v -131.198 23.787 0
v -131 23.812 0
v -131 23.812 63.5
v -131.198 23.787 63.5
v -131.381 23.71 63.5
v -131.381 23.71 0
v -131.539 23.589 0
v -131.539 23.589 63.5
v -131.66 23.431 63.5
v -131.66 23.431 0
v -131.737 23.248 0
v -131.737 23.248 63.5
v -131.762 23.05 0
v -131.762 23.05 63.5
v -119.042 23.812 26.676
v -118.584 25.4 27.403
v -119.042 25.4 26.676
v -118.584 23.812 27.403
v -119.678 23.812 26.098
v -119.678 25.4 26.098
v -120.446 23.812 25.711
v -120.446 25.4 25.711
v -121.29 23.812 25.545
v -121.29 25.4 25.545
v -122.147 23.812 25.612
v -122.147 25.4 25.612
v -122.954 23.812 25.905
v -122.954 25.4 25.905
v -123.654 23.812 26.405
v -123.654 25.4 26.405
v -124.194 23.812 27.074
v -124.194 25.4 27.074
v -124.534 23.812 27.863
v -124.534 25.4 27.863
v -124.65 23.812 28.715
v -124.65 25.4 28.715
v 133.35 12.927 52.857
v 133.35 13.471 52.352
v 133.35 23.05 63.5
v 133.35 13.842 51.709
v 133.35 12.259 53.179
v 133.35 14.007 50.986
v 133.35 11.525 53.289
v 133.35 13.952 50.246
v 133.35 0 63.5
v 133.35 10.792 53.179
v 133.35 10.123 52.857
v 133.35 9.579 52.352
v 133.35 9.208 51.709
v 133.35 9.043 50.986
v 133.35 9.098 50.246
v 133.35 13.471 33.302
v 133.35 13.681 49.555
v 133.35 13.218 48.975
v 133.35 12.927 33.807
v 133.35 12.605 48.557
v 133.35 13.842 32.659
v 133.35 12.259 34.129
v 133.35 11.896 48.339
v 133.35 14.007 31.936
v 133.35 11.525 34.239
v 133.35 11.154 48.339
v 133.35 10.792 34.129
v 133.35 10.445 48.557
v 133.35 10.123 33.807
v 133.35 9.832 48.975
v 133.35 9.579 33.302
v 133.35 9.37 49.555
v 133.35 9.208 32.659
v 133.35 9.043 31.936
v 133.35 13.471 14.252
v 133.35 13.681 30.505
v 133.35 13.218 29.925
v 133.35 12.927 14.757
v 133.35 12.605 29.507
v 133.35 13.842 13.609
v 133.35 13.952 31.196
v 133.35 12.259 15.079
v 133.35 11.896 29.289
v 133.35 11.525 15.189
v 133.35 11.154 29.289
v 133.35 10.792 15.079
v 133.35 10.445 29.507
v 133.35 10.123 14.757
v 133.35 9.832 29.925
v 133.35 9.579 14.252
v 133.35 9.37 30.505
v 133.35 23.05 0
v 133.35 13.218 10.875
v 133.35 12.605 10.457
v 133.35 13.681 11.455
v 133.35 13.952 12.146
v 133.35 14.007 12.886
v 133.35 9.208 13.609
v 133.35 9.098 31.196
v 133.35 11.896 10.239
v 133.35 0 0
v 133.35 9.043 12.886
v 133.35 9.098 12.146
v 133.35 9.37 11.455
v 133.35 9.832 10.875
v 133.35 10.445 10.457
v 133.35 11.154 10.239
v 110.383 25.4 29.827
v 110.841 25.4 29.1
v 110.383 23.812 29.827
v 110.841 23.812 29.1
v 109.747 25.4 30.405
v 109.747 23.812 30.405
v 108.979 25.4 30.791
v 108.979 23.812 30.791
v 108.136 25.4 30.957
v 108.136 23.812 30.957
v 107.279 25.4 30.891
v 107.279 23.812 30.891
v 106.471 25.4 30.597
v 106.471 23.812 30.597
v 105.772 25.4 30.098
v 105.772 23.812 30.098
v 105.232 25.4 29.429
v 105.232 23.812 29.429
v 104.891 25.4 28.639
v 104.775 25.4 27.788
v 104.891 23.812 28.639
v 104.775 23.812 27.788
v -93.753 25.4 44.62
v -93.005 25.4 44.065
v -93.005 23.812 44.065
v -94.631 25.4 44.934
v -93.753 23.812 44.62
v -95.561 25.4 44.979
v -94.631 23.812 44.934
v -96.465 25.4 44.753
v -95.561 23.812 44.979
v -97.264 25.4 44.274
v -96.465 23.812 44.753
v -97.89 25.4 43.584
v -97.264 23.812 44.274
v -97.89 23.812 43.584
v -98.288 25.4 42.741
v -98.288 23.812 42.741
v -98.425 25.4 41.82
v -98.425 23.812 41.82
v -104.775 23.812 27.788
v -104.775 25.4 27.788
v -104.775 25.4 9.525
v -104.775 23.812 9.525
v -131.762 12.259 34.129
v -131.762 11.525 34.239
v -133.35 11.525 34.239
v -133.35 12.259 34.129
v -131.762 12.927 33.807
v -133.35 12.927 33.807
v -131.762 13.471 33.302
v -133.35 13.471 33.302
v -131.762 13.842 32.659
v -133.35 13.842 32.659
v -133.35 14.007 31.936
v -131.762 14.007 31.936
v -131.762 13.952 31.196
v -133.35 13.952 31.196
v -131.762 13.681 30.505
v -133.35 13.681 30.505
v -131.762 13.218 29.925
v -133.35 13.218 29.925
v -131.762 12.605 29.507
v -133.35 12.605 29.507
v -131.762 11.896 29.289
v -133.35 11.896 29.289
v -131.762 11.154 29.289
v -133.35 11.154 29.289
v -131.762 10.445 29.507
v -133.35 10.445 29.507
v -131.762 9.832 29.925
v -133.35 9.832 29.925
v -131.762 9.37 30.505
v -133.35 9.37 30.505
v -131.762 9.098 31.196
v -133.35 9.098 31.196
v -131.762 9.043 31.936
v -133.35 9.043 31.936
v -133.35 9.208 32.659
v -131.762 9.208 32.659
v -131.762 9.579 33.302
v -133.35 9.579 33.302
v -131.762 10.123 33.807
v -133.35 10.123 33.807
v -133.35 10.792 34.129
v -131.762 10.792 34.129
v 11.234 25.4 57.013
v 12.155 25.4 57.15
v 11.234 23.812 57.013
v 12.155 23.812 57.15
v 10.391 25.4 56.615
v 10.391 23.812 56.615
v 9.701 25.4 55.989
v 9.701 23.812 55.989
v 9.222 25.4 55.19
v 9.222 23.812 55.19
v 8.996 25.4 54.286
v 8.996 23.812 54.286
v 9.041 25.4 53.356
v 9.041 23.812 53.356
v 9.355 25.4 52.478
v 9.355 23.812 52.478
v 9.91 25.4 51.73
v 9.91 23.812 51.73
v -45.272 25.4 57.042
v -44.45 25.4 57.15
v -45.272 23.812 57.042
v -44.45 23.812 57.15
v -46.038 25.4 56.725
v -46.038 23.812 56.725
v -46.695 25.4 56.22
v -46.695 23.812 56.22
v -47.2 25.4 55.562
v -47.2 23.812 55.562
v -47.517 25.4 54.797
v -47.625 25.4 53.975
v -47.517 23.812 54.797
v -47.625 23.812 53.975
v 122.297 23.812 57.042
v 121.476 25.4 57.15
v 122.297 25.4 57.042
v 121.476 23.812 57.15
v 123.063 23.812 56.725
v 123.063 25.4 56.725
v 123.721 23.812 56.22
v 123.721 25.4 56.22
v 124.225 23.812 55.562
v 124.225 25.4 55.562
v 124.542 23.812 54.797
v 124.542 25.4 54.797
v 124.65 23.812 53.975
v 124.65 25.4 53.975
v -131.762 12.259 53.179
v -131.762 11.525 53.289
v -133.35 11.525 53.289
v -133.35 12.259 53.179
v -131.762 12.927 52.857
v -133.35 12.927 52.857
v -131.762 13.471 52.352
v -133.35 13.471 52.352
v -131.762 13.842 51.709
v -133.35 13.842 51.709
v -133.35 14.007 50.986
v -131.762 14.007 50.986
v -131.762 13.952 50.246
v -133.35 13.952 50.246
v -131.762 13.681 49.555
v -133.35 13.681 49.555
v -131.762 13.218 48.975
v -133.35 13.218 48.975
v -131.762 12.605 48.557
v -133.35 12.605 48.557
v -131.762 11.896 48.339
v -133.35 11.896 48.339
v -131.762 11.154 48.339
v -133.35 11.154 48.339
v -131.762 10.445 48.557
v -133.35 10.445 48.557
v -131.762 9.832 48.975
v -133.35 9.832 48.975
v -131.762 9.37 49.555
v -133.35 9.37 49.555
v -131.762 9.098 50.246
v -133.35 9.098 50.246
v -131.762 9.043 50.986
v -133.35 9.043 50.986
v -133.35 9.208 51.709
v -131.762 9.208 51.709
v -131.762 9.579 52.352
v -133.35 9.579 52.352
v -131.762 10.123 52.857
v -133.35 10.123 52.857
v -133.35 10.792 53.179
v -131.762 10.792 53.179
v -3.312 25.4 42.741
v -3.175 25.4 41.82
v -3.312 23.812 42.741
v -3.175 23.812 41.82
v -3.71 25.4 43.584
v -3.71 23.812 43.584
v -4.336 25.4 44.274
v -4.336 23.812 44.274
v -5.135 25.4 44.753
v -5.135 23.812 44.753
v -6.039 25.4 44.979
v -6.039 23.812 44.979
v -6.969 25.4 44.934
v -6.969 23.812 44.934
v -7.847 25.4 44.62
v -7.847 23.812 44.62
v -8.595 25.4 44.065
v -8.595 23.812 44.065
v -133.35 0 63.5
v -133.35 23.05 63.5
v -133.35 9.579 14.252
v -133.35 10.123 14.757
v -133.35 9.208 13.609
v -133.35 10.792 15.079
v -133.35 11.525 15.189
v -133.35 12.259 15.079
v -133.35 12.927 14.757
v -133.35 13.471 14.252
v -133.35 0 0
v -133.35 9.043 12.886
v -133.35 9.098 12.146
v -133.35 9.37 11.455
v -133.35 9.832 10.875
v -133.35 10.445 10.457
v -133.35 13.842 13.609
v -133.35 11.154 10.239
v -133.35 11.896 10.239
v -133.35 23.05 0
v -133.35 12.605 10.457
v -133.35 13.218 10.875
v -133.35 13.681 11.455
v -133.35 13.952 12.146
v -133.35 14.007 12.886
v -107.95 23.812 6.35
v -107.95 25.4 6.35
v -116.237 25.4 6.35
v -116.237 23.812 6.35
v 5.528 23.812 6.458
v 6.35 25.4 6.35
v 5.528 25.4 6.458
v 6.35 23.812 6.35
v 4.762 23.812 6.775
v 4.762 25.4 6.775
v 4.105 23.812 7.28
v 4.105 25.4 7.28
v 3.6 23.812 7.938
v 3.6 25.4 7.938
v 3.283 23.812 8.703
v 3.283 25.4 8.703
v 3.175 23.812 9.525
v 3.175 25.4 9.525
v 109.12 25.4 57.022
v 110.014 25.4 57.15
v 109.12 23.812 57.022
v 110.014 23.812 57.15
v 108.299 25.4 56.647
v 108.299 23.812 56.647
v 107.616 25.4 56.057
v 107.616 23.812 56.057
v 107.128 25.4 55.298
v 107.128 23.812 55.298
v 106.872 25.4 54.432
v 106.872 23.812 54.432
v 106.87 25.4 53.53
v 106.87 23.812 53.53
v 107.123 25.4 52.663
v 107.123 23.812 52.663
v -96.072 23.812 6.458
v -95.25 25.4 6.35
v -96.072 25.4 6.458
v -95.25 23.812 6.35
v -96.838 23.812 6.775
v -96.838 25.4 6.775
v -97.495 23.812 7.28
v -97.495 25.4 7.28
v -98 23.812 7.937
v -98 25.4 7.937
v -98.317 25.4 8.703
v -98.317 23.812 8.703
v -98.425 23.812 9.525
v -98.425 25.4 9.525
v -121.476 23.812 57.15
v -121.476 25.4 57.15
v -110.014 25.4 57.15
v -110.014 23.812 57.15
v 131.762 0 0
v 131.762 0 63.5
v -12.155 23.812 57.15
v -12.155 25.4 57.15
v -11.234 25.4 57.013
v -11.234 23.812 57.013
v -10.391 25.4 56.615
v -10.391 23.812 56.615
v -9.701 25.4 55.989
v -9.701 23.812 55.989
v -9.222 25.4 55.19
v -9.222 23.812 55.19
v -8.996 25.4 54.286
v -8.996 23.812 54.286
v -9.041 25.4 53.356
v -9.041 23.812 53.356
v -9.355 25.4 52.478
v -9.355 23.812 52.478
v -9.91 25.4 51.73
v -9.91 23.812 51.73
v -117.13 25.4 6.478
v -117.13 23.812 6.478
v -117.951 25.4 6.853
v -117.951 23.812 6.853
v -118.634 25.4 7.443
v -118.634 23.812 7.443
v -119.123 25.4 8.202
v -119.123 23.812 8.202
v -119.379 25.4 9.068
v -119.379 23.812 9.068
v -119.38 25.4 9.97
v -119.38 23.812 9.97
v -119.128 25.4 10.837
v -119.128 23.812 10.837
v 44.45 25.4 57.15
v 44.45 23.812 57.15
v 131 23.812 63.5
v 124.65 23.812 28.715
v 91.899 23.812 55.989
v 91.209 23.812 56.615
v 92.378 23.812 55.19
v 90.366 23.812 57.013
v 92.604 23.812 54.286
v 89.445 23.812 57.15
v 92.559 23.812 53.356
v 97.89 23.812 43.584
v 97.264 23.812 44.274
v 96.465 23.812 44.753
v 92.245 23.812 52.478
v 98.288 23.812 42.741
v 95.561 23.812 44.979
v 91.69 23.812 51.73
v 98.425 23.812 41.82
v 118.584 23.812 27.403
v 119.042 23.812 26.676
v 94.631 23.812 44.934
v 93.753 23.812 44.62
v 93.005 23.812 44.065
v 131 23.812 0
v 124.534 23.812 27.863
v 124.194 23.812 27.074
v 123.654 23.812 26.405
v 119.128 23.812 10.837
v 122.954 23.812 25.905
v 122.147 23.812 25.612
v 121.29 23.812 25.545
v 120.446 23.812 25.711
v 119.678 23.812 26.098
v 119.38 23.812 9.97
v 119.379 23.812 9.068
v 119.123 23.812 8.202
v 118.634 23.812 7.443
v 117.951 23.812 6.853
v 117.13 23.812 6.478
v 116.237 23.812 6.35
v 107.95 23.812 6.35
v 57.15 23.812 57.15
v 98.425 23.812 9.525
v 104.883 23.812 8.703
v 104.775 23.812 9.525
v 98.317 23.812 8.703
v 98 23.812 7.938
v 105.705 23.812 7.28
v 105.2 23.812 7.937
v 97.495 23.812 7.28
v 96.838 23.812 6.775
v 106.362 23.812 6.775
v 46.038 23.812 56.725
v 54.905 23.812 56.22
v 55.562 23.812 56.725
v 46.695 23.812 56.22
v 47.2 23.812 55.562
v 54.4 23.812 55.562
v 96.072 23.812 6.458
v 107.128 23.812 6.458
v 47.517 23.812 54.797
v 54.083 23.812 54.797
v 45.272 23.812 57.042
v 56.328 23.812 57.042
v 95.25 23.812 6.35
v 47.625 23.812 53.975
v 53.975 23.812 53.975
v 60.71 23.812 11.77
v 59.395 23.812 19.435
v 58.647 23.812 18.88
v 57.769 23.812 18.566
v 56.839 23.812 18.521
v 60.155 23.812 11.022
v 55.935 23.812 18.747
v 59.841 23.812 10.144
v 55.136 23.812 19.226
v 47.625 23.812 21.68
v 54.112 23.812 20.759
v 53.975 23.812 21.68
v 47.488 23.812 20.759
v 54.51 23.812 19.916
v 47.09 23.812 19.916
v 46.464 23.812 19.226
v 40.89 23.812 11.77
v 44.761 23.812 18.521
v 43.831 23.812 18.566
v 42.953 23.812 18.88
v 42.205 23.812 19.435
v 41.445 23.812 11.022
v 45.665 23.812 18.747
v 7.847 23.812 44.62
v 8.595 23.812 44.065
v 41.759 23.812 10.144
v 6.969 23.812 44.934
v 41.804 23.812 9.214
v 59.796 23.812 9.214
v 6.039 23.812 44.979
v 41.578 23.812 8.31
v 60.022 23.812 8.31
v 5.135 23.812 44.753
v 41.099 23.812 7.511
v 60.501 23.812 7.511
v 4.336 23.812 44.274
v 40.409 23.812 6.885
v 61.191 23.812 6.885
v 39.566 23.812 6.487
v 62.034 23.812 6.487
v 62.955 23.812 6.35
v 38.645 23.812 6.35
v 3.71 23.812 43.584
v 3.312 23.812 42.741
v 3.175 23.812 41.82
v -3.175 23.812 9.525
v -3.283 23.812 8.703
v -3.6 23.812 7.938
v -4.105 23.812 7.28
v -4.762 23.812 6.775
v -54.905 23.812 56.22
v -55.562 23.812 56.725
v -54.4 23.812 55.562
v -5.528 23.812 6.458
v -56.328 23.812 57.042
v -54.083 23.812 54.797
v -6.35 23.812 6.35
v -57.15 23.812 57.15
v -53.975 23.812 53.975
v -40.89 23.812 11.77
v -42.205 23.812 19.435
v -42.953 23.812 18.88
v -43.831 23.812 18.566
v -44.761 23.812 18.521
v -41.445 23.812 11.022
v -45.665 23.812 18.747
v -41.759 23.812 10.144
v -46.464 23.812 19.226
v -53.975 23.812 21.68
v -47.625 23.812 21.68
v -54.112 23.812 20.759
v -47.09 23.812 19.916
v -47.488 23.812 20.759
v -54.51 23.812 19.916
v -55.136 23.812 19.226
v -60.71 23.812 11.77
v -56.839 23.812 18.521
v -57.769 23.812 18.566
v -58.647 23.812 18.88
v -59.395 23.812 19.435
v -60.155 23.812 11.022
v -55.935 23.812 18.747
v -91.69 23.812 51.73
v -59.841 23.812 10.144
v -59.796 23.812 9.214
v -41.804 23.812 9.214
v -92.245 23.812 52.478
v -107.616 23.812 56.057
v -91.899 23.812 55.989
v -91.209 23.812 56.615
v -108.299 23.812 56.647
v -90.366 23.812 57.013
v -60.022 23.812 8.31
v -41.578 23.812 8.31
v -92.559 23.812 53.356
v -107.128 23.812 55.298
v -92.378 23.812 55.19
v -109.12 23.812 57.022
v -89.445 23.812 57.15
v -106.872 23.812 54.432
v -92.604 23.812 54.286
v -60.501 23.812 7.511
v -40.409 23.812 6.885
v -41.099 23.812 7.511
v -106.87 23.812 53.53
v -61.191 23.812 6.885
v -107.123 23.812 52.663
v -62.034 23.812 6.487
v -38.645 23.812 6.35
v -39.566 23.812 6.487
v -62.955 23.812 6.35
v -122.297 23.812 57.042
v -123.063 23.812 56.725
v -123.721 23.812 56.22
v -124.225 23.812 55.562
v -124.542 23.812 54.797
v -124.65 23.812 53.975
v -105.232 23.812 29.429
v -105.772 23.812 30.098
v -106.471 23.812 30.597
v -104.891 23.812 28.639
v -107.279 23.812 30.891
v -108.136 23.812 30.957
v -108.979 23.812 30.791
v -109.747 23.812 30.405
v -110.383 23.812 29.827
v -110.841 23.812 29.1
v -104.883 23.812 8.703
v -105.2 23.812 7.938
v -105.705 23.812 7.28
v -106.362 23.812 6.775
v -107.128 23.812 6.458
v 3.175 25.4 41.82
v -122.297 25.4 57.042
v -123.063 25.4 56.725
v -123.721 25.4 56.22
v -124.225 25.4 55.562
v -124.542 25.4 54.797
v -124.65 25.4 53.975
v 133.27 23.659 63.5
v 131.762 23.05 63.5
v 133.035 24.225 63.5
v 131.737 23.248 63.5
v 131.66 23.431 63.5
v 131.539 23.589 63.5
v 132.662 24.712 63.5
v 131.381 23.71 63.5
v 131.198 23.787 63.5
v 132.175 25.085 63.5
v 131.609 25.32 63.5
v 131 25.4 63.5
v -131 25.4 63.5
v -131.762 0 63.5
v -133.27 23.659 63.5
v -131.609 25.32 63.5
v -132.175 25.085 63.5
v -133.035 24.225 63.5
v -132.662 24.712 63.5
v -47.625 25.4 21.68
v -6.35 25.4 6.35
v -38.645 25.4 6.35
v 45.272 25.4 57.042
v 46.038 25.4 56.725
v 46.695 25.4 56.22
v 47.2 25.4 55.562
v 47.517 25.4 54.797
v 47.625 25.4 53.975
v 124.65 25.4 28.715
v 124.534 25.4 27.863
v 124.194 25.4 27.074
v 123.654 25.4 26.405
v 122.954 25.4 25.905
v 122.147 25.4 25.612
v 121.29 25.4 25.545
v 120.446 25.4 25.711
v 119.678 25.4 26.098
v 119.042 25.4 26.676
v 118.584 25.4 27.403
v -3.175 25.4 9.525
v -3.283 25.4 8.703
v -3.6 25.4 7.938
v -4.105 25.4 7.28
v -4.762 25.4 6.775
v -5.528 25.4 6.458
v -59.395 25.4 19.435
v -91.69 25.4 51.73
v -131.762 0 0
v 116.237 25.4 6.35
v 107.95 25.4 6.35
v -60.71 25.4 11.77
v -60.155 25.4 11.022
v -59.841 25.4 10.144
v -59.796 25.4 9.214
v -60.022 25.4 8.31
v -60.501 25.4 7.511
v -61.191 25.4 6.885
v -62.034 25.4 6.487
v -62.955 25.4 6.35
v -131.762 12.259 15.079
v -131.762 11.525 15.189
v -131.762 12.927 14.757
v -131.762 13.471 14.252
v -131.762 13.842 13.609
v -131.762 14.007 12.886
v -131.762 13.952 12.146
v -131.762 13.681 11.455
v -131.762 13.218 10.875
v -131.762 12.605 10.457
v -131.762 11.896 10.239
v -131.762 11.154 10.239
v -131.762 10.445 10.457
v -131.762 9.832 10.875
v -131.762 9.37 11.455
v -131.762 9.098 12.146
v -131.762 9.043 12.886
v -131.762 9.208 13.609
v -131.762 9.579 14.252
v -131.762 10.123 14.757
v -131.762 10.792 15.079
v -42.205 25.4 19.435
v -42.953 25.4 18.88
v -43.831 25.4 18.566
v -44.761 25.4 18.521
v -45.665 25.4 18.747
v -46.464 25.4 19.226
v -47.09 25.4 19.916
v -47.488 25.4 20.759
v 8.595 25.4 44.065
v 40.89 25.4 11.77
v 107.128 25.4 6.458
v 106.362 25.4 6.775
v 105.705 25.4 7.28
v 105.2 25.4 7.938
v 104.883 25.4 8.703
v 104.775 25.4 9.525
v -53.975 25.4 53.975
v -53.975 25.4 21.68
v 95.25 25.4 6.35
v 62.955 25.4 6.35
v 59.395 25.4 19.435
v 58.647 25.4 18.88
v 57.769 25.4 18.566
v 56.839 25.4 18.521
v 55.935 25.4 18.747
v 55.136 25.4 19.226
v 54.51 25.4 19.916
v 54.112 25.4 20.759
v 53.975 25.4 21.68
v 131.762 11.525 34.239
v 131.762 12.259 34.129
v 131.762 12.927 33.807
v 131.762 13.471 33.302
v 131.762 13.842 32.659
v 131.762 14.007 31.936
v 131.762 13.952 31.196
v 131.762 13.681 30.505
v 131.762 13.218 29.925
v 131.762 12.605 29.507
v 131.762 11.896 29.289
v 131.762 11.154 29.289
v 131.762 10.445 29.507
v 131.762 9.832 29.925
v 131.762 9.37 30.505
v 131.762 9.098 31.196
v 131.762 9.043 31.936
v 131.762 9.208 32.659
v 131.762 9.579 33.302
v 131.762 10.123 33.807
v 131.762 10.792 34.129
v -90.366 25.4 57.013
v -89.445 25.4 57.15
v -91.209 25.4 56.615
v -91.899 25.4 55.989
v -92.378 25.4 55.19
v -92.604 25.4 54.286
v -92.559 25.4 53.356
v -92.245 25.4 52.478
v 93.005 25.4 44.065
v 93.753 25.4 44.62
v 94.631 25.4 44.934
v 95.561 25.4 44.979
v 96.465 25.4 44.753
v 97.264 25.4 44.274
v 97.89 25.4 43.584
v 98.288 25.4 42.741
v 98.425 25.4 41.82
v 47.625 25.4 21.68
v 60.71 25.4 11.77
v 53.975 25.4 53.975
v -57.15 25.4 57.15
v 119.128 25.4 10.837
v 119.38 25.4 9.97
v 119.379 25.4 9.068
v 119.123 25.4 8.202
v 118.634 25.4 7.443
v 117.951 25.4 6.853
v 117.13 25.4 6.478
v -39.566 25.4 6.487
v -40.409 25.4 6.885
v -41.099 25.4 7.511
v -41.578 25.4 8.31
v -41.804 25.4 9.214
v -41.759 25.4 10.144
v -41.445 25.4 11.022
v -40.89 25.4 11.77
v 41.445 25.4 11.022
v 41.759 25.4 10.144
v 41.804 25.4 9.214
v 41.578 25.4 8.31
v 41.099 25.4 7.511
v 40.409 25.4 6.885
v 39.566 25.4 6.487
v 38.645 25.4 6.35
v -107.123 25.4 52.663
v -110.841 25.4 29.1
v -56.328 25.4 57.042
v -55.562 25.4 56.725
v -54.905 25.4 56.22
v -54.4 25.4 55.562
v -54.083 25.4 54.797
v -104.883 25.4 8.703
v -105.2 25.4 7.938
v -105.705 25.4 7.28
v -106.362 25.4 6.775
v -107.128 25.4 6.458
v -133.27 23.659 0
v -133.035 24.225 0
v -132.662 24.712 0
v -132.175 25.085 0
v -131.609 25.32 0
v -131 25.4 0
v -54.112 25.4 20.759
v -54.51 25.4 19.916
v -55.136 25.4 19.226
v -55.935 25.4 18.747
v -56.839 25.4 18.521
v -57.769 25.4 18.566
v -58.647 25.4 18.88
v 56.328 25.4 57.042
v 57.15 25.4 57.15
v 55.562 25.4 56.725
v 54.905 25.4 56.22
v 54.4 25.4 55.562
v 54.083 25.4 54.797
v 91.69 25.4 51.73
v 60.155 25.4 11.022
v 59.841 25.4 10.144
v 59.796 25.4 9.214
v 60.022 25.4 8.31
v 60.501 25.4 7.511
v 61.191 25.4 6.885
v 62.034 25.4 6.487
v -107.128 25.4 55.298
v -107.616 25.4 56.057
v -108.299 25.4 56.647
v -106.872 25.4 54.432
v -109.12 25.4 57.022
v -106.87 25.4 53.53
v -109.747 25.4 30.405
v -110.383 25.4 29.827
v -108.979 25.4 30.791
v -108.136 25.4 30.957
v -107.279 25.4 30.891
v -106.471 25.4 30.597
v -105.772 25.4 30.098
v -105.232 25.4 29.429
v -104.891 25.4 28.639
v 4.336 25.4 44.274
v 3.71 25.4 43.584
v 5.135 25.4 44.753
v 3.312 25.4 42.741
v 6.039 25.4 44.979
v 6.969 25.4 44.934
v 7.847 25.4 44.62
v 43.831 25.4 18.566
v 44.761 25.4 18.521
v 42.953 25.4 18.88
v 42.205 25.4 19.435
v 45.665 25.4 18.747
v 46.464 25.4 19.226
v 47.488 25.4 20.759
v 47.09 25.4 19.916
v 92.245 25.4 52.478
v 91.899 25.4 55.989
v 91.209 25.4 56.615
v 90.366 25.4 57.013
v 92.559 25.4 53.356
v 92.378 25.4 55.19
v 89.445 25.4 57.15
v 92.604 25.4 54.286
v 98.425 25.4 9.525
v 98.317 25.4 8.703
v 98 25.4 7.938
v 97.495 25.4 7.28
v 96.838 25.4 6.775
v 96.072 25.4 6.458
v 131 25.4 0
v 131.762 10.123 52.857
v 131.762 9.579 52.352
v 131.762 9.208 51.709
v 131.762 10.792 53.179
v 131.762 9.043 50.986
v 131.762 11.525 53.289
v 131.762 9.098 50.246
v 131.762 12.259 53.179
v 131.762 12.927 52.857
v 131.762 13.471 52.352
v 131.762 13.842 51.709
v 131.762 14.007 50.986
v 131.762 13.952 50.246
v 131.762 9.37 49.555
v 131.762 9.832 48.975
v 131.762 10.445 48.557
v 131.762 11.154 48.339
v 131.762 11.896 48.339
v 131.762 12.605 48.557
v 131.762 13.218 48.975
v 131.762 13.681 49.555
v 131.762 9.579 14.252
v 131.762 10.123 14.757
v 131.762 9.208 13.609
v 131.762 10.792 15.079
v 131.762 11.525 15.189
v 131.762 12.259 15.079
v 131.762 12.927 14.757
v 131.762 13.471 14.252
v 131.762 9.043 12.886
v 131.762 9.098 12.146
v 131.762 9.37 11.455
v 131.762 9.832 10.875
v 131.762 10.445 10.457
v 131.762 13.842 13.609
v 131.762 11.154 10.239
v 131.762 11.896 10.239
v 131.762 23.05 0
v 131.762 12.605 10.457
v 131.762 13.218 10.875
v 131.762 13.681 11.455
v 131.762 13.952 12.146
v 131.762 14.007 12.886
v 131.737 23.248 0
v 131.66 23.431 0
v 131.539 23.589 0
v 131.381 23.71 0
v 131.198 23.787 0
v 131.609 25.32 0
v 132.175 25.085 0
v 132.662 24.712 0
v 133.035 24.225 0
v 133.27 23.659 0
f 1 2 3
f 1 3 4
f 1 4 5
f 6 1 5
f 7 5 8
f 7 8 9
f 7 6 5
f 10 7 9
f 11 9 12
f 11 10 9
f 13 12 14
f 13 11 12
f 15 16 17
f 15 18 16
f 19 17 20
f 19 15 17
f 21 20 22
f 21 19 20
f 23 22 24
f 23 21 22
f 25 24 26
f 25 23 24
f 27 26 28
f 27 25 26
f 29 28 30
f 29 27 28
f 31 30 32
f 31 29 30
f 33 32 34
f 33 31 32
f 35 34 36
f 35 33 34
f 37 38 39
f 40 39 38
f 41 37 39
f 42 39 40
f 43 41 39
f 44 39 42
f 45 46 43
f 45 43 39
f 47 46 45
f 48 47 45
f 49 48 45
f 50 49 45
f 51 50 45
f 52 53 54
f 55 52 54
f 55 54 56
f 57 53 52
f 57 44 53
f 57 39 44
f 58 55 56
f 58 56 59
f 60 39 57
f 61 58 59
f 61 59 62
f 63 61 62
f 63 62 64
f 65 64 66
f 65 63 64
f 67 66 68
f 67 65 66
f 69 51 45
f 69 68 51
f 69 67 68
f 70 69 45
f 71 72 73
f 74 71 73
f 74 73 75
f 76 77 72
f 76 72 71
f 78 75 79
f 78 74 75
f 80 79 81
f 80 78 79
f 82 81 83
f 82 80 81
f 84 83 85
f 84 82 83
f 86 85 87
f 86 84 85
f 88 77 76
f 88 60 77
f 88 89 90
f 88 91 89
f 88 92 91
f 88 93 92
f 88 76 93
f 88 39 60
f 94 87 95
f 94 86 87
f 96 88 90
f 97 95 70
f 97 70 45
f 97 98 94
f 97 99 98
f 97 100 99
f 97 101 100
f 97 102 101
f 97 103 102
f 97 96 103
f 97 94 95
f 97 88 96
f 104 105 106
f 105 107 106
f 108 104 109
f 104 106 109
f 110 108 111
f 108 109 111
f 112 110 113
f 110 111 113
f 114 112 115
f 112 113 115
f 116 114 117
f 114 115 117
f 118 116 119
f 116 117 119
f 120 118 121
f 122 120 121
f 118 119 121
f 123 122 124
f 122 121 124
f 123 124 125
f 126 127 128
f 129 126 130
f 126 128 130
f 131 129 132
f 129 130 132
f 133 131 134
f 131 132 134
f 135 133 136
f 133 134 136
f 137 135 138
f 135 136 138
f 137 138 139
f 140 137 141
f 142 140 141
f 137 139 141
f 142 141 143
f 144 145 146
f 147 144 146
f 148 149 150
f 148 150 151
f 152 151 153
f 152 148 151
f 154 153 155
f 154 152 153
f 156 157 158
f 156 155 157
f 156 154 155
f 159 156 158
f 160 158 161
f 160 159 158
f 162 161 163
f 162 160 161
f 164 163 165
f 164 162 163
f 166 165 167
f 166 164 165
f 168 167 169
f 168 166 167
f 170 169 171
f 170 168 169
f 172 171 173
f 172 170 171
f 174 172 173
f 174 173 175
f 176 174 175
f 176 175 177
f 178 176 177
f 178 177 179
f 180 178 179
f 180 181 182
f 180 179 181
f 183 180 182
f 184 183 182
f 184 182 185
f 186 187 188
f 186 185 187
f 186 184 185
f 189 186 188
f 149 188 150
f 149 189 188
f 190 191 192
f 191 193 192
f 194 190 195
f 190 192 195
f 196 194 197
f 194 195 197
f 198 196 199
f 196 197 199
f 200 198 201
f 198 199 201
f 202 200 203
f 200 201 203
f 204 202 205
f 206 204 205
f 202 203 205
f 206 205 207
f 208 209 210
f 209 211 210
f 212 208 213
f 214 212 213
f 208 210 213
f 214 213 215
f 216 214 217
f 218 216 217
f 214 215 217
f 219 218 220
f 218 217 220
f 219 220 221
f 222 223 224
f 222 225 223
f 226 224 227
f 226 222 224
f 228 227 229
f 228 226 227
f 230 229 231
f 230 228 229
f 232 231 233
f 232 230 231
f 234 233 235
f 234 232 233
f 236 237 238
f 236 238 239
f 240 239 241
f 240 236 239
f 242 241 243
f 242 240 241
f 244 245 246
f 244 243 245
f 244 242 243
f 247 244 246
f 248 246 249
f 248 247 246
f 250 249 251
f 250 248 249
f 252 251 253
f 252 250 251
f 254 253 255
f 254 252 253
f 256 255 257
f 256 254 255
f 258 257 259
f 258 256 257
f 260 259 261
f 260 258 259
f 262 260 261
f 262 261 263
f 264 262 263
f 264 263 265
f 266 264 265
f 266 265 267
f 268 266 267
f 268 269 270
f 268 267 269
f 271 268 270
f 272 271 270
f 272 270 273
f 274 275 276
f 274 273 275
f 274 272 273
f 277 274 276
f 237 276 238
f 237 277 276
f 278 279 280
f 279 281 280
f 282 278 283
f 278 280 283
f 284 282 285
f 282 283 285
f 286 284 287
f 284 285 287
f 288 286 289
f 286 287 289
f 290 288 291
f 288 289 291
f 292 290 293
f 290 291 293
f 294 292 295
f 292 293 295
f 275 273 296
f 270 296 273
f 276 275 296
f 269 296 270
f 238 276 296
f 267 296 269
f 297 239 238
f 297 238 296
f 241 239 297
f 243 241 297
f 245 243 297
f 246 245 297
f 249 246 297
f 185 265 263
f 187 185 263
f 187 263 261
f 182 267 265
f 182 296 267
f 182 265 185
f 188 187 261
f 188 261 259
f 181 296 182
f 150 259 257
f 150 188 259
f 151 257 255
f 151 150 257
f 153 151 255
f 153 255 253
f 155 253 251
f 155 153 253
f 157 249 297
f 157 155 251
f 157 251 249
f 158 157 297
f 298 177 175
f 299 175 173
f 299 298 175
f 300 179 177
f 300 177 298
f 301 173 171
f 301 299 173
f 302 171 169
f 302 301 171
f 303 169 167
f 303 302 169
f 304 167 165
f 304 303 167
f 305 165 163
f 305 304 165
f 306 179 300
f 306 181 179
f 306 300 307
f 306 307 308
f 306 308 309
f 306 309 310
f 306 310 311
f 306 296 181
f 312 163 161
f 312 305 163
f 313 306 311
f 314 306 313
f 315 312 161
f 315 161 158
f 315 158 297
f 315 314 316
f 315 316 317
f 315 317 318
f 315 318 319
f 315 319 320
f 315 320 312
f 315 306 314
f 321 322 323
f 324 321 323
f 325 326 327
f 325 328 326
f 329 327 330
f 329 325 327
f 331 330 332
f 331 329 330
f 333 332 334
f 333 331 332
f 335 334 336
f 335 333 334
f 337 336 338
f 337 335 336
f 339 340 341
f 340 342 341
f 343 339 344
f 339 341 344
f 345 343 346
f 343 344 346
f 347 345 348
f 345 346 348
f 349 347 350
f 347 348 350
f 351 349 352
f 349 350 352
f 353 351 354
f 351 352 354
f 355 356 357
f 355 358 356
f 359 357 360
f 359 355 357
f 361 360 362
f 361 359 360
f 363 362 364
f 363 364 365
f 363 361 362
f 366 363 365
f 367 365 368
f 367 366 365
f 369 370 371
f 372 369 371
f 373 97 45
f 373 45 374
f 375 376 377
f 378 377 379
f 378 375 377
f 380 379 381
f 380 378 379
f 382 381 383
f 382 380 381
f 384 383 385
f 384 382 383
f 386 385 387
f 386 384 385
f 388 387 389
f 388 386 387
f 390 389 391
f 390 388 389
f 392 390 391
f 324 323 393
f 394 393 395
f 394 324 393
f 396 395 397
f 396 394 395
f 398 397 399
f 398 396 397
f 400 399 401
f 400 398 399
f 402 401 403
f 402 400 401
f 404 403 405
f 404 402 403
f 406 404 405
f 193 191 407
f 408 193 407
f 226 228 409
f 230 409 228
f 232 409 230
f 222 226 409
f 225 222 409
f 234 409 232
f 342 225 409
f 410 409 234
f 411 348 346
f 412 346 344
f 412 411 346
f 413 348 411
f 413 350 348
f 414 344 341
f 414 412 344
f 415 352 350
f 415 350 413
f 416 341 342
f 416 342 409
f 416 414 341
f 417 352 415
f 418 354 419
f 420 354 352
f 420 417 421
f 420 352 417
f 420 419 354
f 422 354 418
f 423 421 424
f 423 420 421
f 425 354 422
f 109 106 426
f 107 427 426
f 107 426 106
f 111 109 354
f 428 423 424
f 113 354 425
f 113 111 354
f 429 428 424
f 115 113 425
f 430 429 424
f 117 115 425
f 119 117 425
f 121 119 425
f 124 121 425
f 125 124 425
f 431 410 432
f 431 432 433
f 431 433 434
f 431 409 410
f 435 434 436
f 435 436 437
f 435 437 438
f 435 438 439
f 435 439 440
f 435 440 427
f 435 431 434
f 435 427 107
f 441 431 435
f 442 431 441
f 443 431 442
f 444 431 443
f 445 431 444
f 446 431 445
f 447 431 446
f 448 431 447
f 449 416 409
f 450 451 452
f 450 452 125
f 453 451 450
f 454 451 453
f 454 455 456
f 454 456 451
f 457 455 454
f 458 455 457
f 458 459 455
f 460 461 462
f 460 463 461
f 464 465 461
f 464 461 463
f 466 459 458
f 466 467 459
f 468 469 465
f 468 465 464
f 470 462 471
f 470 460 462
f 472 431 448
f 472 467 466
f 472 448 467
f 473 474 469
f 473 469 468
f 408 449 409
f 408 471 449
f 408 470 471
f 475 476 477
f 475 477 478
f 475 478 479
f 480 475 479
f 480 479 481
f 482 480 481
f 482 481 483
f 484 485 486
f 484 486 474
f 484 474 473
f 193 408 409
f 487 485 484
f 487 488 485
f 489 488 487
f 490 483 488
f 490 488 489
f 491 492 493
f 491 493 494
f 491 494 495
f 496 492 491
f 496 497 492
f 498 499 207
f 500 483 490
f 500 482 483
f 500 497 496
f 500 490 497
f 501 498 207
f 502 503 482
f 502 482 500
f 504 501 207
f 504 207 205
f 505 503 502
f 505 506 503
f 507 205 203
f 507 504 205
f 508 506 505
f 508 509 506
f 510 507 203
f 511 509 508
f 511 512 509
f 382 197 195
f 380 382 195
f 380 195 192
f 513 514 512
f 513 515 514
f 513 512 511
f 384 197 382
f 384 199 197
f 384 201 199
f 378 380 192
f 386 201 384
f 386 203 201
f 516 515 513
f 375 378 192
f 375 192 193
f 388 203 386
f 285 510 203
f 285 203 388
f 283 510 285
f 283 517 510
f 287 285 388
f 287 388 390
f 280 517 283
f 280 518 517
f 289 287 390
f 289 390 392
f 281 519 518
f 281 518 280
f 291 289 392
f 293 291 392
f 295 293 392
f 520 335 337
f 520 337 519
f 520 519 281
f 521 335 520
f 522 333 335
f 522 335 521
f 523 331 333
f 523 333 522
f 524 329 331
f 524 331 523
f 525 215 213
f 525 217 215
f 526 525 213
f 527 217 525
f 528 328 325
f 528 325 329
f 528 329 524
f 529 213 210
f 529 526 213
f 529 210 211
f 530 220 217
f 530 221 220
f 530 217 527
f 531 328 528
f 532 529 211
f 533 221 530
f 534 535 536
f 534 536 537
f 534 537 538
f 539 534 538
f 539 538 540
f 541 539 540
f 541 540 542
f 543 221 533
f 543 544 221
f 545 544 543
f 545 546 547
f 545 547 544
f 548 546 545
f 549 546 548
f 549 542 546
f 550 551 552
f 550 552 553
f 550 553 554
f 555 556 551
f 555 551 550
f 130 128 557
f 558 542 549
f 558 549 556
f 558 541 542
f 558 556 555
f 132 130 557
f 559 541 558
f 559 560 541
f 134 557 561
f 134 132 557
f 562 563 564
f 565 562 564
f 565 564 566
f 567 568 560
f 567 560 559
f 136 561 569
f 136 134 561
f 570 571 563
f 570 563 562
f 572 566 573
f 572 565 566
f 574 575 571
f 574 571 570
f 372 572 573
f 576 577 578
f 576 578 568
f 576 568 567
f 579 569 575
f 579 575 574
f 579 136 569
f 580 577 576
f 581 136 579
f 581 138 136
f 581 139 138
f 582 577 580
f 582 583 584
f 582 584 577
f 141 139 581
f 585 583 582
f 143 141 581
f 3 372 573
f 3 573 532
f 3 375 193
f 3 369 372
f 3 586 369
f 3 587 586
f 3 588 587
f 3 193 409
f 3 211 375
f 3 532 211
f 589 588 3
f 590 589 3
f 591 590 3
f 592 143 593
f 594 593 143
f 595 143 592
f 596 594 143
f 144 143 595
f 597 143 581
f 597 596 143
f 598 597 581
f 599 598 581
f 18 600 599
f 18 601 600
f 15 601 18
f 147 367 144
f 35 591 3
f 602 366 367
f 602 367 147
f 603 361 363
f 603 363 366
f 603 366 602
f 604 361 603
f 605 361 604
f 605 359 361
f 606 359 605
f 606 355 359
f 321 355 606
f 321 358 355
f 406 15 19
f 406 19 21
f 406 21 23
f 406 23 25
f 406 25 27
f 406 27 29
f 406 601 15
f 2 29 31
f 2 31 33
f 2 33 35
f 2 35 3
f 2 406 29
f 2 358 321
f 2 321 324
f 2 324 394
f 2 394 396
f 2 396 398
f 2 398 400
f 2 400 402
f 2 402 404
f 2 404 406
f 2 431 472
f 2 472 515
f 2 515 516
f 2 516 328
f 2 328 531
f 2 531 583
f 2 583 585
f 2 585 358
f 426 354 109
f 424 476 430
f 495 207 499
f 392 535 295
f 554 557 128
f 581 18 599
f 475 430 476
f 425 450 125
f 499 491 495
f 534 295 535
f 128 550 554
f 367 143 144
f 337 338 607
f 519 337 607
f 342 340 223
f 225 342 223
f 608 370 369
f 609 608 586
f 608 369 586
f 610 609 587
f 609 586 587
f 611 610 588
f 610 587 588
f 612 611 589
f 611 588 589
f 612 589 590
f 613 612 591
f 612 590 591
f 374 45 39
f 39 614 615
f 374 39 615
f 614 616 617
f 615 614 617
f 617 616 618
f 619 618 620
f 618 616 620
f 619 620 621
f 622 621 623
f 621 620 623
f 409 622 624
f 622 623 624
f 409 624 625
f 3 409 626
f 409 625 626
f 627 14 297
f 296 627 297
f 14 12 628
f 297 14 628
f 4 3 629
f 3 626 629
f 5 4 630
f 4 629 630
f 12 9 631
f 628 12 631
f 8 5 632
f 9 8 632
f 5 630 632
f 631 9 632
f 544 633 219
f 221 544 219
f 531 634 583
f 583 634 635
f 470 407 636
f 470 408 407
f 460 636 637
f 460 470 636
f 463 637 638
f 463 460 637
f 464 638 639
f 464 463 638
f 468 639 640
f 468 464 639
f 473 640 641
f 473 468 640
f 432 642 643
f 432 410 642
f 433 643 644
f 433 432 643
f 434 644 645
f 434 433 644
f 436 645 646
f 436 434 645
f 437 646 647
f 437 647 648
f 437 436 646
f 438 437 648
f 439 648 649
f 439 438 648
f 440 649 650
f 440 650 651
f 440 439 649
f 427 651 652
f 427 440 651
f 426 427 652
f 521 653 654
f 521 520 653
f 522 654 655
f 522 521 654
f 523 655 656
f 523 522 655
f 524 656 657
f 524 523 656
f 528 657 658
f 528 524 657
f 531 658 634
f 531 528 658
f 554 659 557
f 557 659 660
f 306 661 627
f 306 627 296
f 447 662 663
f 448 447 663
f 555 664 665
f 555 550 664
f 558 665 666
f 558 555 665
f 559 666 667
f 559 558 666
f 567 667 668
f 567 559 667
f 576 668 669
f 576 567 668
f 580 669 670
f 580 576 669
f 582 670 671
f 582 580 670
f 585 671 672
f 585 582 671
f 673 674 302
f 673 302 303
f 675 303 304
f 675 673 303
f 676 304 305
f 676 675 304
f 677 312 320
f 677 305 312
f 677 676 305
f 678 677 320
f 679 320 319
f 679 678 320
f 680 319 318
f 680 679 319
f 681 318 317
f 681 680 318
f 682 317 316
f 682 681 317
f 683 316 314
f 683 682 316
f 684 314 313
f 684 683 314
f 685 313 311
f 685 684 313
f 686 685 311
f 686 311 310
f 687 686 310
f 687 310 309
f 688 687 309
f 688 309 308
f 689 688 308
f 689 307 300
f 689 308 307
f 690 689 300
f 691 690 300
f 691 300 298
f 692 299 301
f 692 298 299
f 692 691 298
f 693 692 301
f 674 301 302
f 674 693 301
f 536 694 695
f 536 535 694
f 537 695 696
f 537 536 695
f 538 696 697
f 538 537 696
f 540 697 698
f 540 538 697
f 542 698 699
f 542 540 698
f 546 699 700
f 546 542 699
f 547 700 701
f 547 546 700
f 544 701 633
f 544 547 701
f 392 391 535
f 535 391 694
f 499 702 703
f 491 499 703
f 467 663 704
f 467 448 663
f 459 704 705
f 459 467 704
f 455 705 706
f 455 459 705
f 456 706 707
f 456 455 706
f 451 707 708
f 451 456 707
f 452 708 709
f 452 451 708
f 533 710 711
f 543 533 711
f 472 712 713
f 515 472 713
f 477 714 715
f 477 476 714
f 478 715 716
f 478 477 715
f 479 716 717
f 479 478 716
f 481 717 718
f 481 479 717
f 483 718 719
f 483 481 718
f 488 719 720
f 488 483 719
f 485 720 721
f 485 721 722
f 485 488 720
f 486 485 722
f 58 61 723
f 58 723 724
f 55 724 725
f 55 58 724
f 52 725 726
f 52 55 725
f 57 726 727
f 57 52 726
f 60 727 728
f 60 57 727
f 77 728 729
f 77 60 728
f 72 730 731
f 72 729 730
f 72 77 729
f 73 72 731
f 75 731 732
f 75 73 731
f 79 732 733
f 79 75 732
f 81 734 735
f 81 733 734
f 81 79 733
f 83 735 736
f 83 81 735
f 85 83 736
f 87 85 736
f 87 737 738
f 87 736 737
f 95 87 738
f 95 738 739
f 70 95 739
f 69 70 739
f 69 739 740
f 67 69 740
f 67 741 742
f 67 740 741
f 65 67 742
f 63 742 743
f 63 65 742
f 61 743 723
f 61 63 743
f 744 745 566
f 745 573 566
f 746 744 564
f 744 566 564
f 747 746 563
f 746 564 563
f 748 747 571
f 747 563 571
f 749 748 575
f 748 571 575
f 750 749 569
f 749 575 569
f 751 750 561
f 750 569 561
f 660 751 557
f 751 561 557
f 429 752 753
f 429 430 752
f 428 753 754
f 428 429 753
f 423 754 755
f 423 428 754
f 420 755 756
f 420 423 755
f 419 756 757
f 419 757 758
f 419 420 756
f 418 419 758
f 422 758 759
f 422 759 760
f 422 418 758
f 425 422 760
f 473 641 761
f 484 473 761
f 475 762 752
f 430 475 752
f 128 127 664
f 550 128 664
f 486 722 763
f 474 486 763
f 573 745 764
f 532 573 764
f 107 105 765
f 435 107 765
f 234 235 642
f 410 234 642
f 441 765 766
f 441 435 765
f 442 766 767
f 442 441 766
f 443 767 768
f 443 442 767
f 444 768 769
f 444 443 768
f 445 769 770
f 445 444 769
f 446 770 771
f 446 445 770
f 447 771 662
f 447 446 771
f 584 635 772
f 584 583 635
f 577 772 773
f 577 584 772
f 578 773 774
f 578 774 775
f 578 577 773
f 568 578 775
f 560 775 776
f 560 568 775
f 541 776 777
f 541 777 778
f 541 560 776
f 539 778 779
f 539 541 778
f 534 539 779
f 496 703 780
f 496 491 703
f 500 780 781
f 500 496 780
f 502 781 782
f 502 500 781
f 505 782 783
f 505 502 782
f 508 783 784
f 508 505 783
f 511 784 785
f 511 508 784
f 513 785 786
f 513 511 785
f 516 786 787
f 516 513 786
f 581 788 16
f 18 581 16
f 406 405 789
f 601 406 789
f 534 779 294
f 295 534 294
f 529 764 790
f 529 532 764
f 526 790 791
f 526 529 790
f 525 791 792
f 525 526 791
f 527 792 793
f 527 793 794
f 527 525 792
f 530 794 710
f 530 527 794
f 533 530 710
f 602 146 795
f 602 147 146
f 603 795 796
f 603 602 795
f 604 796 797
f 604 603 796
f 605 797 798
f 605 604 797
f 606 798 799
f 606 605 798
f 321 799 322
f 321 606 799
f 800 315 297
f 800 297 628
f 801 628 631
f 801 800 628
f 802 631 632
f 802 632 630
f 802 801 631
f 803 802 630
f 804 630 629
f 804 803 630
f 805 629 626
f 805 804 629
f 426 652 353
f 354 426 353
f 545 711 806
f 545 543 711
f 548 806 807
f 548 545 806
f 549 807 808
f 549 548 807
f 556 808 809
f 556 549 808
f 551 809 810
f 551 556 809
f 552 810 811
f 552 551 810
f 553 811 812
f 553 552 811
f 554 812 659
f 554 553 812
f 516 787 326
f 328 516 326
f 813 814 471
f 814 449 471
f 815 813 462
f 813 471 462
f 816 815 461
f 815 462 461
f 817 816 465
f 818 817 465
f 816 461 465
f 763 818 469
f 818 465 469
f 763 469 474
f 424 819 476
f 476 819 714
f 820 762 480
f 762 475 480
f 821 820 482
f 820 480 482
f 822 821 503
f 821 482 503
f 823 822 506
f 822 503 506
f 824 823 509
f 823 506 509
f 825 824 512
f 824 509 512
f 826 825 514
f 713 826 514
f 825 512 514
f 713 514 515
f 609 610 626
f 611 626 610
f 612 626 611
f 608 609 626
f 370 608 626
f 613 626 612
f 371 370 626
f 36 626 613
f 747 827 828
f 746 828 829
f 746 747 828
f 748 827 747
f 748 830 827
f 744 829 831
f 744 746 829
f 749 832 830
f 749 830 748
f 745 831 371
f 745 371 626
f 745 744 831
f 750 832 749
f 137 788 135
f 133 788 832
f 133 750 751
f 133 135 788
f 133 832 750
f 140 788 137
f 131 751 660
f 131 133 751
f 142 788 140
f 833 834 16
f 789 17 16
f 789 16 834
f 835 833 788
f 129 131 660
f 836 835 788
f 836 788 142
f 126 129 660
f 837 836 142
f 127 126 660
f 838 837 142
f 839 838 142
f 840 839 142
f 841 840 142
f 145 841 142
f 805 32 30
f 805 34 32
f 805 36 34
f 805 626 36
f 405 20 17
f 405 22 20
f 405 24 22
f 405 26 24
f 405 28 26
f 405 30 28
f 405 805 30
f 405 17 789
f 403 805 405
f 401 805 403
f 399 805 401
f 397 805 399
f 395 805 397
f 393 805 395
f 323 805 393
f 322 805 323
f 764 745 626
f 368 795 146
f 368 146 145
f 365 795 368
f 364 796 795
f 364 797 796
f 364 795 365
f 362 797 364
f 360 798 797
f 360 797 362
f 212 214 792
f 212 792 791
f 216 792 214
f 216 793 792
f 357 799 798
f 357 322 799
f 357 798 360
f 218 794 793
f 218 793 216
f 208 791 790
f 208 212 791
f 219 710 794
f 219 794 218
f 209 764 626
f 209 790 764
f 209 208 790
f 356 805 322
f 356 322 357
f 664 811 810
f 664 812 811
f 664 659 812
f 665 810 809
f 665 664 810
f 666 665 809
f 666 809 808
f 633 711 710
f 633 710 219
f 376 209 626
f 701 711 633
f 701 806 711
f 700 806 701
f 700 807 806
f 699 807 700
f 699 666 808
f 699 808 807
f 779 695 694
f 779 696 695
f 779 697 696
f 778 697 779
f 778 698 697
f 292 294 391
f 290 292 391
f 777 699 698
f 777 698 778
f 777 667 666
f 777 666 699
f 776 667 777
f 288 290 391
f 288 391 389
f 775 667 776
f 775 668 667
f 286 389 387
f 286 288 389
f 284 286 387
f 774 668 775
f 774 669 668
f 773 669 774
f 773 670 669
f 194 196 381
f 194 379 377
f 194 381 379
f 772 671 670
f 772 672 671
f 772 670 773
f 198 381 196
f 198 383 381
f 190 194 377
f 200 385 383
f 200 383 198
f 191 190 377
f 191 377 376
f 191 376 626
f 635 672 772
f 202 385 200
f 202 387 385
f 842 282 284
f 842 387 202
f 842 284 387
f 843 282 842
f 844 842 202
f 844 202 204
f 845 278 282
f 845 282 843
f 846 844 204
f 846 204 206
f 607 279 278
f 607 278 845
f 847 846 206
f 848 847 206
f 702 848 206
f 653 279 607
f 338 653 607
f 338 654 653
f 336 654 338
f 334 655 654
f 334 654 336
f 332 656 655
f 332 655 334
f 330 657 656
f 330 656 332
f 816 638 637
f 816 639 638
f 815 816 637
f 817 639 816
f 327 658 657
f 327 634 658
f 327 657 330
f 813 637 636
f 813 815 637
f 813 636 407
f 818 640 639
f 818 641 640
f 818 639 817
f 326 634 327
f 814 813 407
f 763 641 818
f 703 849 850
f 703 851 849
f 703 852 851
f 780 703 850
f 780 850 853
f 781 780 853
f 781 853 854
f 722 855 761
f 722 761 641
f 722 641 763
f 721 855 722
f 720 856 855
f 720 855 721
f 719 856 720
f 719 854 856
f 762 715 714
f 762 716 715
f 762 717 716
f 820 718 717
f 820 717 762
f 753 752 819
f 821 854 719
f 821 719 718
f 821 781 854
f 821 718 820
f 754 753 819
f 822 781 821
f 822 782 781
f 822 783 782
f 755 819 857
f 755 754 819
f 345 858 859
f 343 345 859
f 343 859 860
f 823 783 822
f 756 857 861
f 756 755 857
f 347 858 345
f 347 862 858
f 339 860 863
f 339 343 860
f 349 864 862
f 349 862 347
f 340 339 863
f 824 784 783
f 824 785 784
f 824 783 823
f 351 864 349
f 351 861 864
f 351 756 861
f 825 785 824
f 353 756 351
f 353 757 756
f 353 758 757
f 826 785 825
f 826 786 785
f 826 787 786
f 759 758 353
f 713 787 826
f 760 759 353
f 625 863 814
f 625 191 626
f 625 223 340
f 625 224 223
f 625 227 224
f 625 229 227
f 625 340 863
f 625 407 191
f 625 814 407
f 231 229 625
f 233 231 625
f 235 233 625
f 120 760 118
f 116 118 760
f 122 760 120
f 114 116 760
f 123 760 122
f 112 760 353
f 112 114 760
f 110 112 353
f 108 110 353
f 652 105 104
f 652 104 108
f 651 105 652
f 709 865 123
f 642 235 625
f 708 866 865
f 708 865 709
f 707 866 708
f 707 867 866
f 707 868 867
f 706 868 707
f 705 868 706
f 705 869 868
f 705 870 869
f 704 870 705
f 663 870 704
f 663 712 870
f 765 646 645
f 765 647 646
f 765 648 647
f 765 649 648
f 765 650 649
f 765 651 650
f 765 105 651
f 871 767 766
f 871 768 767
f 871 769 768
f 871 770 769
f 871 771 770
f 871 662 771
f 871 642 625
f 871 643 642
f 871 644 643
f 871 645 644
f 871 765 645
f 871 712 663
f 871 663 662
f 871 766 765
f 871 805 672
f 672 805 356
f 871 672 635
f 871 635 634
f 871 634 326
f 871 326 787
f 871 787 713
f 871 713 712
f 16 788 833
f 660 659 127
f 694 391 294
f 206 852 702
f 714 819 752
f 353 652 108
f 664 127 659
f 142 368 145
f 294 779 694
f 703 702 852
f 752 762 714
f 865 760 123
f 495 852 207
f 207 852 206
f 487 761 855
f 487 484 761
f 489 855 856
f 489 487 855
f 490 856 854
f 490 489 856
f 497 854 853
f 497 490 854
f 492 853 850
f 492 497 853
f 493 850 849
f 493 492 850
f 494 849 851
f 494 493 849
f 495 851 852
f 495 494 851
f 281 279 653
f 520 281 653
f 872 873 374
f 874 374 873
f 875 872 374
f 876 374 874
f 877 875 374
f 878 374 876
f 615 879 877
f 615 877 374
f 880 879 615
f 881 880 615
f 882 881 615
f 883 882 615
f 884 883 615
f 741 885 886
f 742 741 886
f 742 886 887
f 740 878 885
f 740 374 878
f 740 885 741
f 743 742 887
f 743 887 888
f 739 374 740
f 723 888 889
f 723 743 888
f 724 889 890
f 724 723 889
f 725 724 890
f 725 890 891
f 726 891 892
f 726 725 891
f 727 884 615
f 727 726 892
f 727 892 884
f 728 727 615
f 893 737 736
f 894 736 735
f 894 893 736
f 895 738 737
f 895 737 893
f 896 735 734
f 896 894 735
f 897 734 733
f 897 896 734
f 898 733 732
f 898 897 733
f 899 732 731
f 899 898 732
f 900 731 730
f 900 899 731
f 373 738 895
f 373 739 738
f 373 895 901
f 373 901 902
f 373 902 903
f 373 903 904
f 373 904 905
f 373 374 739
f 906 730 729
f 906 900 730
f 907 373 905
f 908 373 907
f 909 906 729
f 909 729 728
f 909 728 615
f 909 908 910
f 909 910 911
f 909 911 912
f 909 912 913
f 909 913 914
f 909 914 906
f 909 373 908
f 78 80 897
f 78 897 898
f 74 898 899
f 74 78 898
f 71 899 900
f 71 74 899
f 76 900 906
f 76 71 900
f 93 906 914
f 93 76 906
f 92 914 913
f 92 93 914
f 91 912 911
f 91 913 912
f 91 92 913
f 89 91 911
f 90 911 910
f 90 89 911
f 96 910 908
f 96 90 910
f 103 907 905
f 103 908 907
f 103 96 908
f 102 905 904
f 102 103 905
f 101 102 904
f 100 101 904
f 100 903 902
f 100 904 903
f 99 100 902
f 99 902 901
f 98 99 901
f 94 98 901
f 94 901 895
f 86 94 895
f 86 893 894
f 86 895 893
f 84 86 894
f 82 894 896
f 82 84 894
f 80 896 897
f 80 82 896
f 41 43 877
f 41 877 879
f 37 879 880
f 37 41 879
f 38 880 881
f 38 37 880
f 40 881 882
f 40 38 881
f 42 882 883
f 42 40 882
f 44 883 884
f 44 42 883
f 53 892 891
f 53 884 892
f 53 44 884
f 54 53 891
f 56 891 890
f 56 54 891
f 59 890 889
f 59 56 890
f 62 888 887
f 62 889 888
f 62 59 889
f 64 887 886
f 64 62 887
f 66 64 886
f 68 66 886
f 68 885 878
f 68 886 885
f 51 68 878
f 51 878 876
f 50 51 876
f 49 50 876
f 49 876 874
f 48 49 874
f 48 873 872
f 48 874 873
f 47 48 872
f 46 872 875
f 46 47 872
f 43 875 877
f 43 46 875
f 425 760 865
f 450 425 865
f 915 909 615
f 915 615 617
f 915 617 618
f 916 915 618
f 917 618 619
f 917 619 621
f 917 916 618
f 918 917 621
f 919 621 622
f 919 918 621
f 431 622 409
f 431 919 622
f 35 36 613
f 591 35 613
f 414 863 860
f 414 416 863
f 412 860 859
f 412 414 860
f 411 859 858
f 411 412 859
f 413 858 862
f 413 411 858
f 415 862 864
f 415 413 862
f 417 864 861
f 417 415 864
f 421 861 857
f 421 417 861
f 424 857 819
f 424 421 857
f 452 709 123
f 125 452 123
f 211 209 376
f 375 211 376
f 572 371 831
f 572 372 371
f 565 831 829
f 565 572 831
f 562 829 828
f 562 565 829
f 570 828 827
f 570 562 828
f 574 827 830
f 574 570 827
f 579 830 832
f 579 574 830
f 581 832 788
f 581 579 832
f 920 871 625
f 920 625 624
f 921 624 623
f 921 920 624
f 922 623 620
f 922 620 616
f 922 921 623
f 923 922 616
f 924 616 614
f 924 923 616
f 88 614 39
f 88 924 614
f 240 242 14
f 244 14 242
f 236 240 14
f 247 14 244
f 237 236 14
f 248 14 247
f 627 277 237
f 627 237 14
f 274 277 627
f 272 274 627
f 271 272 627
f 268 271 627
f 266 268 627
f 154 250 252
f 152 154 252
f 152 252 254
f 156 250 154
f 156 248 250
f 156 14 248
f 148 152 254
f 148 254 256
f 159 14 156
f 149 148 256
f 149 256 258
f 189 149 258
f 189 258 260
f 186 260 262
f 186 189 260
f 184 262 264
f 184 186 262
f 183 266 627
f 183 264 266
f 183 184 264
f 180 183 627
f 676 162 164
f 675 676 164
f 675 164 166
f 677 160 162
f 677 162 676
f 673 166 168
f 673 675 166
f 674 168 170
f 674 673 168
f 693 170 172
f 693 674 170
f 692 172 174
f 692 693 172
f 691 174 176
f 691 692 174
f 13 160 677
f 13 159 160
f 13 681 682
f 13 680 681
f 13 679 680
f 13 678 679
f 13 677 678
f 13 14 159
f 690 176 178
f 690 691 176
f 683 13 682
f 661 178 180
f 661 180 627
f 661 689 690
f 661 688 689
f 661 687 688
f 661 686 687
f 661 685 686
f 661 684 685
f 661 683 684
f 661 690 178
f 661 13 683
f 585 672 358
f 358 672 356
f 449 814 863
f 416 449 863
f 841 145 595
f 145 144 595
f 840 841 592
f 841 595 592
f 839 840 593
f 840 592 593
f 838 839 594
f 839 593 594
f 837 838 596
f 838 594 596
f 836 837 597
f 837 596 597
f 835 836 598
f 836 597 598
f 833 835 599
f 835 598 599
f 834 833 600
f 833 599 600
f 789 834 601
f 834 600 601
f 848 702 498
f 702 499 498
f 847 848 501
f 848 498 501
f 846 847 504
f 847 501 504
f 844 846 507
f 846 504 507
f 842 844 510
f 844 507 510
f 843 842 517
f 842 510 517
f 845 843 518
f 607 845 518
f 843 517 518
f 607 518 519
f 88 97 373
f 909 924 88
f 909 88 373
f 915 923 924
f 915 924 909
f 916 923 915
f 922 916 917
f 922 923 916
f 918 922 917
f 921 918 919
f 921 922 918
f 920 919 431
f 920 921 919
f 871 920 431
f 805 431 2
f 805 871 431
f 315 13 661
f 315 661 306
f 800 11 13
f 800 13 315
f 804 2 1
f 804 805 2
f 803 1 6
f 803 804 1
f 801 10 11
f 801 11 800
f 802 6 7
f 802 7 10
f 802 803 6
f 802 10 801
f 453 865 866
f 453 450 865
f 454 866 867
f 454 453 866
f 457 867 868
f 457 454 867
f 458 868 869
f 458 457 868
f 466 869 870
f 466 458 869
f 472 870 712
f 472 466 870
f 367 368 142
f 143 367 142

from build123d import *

# Parameters (mm, degrees)
BASE_FLANGE1_DEPTH      = 63.5
CUT_EXTRUDE1_DEPTH      = 276.329439036
CUT_EXTRUDE1_DEPTH_BACK = 276.329439036
SKETCH6_R               = 2.4892
CUT_EXTRUDE2_DEPTH      = 150.865381259
FILLET1_R               = 3.175


# Sheet-metal steps are written as plain solids
with BuildPart() as part:
    # Sketch1 → Base-Flange1 (new body)
    with BuildSketch(Plane.XY):
        with BuildLine():
            Line((-133.35, 0), (-133.35, 23.0505))
            ThreePointArc((-133.35, 23.0505), (-132.661847382, 24.711847382), (-131.0005, 25.4))
            Line((-131.0005, 25.4), (131.0005, 25.4))
            ThreePointArc((131.0005, 25.4), (132.661847382, 24.711847382), (133.35, 23.0505))
            Line((133.35, 23.0505), (133.35, 0))
            Line((133.35, 0), (131.7625, 0))
            Line((131.7625, 0), (131.7625, 23.0505))
            ThreePointArc((131.7625, 23.0505), (131.539315367, 23.589315367), (131.0005, 23.8125))
            Line((131.0005, 23.8125), (-131.0005, 23.8125))
            ThreePointArc((-131.0005, 23.8125), (-131.539315367, 23.589315367), (-131.7625, 23.0505))
            Line((-131.7625, 23.0505), (-131.7625, 0))
            Line((-131.7625, 0), (-133.35, 0))
        make_face()
    extrude(amount=BASE_FLANGE1_DEPTH)

    # Sketch6 → Cut-Extrude1 (cut, two sides: drawn at the far end of the back side and taken through both)
    with BuildSketch(Plane.ZY.offset(133.35).offset(-CUT_EXTRUDE1_DEPTH_BACK)):
        with Locations((12.7, 11.52525)):
            Circle(SKETCH6_R)
        with Locations((50.8, 11.52525)):
            Circle(SKETCH6_R)
        with Locations((31.75, 11.52525)):
            Circle(SKETCH6_R)
    extrude(amount=CUT_EXTRUDE1_DEPTH + CUT_EXTRUDE1_DEPTH_BACK, mode=Mode.SUBTRACT)

    # Sketch7 → Cut-Extrude2 (cut, through all)
    with BuildSketch(Plane(origin=(0, 25.4, 0), x_dir=(1, 0, 0), z_dir=(0, 1, 0))):
        Polygon((-104.775, -42.468871356), (-104.775, -6.35), (-121.163937878, -6.35), align=None)
        Polygon((-124.6505, -57.15), (-105.086562122, -57.15), (-124.6505, -14.033883464), align=None)
        Polygon((-98.425, -49.484871939), (-55.290128061, -6.35), (-98.425, -6.35), align=None)
        Polygon((-97.109871939, -57.15), (-53.975, -57.15), (-53.975, -14.015128061), align=None)
        Polygon((-47.625, -57.15), (-4.490128061, -57.15), (-47.625, -14.015128061), align=None)
        Polygon((-3.175, -49.484871939), (-3.175, -6.35), (-46.309871939, -6.35), align=None)
        Polygon((3.175, -49.484871939), (46.309871939, -6.35), (3.175, -6.35), align=None)
        Polygon((4.490128061, -57.15), (47.625, -57.15), (47.625, -14.015128061), align=None)
        Polygon((105.086562122, -57.15), (124.6505, -57.15), (124.6505, -14.033883464), align=None)
        Polygon((104.775, -42.468871356), (121.163937878, -6.35), (104.775, -6.35), align=None)
        Polygon((55.290128061, -6.35), (98.425, -49.484871939), (98.425, -6.35), align=None)
        Polygon((53.975, -57.15), (97.109871939, -57.15), (53.975, -14.015128061), align=None)
    extrude(amount=-CUT_EXTRUDE2_DEPTH, mode=Mode.SUBTRACT)

    # Fillet1
    fillet1_edges = [part.edges().sort_by_distance(p)[0] for p in [
        (-3.175, 24.60625, 6.35),
        (-3.175, 24.60625, 49.484871939),
        (-46.309871939, 24.60625, 6.35),
        (3.175, 24.60625, 6.35),
        (46.309871939, 24.60625, 6.35),
        (3.175, 24.60625, 49.484871939),
        (47.625, 24.60625, 14.015128061),
        (47.625, 24.60625, 57.15),
        (4.490128061, 24.60625, 57.15),
        (124.6505, 24.60625, 14.033883464),
        (124.6505, 24.60625, 57.15),
        (105.086562122, 24.60625, 57.15),
        (-105.086562122, 24.60625, 57.15),
        (-124.6505, 24.60625, 57.15),
        (-124.6505, 24.60625, 14.033883464),
        (-55.290128061, 24.60625, 6.35),
        (-98.425, 24.60625, 49.484871939),
        (-98.425, 24.60625, 6.35),
        (-53.975, 24.60625, 14.015128061),
        (-53.975, 24.60625, 57.15),
        (-97.109871939, 24.60625, 57.15),
        (-4.490128061, 24.60625, 57.15),
        (-47.625, 24.60625, 57.15),
        (-47.625, 24.60625, 14.015128061),
        (53.975, 24.60625, 14.015128061),
        (97.109871939, 24.60625, 57.15),
        (53.975, 24.60625, 57.15),
        (98.425, 24.60625, 49.484871939),
        (55.290128061, 24.60625, 6.35),
        (98.425, 24.60625, 6.35),
        (121.163937878, 24.60625, 6.35),
        (104.775, 24.60625, 42.468871356),
        (104.775, 24.60625, 6.35),
        (-104.775, 24.60625, 42.468871356),
        (-121.163937878, 24.60625, 6.35),
        (-104.775, 24.60625, 6.35),
    ]]
    fillet(fillet1_edges, radius=FILLET1_R)


solid = part.part
